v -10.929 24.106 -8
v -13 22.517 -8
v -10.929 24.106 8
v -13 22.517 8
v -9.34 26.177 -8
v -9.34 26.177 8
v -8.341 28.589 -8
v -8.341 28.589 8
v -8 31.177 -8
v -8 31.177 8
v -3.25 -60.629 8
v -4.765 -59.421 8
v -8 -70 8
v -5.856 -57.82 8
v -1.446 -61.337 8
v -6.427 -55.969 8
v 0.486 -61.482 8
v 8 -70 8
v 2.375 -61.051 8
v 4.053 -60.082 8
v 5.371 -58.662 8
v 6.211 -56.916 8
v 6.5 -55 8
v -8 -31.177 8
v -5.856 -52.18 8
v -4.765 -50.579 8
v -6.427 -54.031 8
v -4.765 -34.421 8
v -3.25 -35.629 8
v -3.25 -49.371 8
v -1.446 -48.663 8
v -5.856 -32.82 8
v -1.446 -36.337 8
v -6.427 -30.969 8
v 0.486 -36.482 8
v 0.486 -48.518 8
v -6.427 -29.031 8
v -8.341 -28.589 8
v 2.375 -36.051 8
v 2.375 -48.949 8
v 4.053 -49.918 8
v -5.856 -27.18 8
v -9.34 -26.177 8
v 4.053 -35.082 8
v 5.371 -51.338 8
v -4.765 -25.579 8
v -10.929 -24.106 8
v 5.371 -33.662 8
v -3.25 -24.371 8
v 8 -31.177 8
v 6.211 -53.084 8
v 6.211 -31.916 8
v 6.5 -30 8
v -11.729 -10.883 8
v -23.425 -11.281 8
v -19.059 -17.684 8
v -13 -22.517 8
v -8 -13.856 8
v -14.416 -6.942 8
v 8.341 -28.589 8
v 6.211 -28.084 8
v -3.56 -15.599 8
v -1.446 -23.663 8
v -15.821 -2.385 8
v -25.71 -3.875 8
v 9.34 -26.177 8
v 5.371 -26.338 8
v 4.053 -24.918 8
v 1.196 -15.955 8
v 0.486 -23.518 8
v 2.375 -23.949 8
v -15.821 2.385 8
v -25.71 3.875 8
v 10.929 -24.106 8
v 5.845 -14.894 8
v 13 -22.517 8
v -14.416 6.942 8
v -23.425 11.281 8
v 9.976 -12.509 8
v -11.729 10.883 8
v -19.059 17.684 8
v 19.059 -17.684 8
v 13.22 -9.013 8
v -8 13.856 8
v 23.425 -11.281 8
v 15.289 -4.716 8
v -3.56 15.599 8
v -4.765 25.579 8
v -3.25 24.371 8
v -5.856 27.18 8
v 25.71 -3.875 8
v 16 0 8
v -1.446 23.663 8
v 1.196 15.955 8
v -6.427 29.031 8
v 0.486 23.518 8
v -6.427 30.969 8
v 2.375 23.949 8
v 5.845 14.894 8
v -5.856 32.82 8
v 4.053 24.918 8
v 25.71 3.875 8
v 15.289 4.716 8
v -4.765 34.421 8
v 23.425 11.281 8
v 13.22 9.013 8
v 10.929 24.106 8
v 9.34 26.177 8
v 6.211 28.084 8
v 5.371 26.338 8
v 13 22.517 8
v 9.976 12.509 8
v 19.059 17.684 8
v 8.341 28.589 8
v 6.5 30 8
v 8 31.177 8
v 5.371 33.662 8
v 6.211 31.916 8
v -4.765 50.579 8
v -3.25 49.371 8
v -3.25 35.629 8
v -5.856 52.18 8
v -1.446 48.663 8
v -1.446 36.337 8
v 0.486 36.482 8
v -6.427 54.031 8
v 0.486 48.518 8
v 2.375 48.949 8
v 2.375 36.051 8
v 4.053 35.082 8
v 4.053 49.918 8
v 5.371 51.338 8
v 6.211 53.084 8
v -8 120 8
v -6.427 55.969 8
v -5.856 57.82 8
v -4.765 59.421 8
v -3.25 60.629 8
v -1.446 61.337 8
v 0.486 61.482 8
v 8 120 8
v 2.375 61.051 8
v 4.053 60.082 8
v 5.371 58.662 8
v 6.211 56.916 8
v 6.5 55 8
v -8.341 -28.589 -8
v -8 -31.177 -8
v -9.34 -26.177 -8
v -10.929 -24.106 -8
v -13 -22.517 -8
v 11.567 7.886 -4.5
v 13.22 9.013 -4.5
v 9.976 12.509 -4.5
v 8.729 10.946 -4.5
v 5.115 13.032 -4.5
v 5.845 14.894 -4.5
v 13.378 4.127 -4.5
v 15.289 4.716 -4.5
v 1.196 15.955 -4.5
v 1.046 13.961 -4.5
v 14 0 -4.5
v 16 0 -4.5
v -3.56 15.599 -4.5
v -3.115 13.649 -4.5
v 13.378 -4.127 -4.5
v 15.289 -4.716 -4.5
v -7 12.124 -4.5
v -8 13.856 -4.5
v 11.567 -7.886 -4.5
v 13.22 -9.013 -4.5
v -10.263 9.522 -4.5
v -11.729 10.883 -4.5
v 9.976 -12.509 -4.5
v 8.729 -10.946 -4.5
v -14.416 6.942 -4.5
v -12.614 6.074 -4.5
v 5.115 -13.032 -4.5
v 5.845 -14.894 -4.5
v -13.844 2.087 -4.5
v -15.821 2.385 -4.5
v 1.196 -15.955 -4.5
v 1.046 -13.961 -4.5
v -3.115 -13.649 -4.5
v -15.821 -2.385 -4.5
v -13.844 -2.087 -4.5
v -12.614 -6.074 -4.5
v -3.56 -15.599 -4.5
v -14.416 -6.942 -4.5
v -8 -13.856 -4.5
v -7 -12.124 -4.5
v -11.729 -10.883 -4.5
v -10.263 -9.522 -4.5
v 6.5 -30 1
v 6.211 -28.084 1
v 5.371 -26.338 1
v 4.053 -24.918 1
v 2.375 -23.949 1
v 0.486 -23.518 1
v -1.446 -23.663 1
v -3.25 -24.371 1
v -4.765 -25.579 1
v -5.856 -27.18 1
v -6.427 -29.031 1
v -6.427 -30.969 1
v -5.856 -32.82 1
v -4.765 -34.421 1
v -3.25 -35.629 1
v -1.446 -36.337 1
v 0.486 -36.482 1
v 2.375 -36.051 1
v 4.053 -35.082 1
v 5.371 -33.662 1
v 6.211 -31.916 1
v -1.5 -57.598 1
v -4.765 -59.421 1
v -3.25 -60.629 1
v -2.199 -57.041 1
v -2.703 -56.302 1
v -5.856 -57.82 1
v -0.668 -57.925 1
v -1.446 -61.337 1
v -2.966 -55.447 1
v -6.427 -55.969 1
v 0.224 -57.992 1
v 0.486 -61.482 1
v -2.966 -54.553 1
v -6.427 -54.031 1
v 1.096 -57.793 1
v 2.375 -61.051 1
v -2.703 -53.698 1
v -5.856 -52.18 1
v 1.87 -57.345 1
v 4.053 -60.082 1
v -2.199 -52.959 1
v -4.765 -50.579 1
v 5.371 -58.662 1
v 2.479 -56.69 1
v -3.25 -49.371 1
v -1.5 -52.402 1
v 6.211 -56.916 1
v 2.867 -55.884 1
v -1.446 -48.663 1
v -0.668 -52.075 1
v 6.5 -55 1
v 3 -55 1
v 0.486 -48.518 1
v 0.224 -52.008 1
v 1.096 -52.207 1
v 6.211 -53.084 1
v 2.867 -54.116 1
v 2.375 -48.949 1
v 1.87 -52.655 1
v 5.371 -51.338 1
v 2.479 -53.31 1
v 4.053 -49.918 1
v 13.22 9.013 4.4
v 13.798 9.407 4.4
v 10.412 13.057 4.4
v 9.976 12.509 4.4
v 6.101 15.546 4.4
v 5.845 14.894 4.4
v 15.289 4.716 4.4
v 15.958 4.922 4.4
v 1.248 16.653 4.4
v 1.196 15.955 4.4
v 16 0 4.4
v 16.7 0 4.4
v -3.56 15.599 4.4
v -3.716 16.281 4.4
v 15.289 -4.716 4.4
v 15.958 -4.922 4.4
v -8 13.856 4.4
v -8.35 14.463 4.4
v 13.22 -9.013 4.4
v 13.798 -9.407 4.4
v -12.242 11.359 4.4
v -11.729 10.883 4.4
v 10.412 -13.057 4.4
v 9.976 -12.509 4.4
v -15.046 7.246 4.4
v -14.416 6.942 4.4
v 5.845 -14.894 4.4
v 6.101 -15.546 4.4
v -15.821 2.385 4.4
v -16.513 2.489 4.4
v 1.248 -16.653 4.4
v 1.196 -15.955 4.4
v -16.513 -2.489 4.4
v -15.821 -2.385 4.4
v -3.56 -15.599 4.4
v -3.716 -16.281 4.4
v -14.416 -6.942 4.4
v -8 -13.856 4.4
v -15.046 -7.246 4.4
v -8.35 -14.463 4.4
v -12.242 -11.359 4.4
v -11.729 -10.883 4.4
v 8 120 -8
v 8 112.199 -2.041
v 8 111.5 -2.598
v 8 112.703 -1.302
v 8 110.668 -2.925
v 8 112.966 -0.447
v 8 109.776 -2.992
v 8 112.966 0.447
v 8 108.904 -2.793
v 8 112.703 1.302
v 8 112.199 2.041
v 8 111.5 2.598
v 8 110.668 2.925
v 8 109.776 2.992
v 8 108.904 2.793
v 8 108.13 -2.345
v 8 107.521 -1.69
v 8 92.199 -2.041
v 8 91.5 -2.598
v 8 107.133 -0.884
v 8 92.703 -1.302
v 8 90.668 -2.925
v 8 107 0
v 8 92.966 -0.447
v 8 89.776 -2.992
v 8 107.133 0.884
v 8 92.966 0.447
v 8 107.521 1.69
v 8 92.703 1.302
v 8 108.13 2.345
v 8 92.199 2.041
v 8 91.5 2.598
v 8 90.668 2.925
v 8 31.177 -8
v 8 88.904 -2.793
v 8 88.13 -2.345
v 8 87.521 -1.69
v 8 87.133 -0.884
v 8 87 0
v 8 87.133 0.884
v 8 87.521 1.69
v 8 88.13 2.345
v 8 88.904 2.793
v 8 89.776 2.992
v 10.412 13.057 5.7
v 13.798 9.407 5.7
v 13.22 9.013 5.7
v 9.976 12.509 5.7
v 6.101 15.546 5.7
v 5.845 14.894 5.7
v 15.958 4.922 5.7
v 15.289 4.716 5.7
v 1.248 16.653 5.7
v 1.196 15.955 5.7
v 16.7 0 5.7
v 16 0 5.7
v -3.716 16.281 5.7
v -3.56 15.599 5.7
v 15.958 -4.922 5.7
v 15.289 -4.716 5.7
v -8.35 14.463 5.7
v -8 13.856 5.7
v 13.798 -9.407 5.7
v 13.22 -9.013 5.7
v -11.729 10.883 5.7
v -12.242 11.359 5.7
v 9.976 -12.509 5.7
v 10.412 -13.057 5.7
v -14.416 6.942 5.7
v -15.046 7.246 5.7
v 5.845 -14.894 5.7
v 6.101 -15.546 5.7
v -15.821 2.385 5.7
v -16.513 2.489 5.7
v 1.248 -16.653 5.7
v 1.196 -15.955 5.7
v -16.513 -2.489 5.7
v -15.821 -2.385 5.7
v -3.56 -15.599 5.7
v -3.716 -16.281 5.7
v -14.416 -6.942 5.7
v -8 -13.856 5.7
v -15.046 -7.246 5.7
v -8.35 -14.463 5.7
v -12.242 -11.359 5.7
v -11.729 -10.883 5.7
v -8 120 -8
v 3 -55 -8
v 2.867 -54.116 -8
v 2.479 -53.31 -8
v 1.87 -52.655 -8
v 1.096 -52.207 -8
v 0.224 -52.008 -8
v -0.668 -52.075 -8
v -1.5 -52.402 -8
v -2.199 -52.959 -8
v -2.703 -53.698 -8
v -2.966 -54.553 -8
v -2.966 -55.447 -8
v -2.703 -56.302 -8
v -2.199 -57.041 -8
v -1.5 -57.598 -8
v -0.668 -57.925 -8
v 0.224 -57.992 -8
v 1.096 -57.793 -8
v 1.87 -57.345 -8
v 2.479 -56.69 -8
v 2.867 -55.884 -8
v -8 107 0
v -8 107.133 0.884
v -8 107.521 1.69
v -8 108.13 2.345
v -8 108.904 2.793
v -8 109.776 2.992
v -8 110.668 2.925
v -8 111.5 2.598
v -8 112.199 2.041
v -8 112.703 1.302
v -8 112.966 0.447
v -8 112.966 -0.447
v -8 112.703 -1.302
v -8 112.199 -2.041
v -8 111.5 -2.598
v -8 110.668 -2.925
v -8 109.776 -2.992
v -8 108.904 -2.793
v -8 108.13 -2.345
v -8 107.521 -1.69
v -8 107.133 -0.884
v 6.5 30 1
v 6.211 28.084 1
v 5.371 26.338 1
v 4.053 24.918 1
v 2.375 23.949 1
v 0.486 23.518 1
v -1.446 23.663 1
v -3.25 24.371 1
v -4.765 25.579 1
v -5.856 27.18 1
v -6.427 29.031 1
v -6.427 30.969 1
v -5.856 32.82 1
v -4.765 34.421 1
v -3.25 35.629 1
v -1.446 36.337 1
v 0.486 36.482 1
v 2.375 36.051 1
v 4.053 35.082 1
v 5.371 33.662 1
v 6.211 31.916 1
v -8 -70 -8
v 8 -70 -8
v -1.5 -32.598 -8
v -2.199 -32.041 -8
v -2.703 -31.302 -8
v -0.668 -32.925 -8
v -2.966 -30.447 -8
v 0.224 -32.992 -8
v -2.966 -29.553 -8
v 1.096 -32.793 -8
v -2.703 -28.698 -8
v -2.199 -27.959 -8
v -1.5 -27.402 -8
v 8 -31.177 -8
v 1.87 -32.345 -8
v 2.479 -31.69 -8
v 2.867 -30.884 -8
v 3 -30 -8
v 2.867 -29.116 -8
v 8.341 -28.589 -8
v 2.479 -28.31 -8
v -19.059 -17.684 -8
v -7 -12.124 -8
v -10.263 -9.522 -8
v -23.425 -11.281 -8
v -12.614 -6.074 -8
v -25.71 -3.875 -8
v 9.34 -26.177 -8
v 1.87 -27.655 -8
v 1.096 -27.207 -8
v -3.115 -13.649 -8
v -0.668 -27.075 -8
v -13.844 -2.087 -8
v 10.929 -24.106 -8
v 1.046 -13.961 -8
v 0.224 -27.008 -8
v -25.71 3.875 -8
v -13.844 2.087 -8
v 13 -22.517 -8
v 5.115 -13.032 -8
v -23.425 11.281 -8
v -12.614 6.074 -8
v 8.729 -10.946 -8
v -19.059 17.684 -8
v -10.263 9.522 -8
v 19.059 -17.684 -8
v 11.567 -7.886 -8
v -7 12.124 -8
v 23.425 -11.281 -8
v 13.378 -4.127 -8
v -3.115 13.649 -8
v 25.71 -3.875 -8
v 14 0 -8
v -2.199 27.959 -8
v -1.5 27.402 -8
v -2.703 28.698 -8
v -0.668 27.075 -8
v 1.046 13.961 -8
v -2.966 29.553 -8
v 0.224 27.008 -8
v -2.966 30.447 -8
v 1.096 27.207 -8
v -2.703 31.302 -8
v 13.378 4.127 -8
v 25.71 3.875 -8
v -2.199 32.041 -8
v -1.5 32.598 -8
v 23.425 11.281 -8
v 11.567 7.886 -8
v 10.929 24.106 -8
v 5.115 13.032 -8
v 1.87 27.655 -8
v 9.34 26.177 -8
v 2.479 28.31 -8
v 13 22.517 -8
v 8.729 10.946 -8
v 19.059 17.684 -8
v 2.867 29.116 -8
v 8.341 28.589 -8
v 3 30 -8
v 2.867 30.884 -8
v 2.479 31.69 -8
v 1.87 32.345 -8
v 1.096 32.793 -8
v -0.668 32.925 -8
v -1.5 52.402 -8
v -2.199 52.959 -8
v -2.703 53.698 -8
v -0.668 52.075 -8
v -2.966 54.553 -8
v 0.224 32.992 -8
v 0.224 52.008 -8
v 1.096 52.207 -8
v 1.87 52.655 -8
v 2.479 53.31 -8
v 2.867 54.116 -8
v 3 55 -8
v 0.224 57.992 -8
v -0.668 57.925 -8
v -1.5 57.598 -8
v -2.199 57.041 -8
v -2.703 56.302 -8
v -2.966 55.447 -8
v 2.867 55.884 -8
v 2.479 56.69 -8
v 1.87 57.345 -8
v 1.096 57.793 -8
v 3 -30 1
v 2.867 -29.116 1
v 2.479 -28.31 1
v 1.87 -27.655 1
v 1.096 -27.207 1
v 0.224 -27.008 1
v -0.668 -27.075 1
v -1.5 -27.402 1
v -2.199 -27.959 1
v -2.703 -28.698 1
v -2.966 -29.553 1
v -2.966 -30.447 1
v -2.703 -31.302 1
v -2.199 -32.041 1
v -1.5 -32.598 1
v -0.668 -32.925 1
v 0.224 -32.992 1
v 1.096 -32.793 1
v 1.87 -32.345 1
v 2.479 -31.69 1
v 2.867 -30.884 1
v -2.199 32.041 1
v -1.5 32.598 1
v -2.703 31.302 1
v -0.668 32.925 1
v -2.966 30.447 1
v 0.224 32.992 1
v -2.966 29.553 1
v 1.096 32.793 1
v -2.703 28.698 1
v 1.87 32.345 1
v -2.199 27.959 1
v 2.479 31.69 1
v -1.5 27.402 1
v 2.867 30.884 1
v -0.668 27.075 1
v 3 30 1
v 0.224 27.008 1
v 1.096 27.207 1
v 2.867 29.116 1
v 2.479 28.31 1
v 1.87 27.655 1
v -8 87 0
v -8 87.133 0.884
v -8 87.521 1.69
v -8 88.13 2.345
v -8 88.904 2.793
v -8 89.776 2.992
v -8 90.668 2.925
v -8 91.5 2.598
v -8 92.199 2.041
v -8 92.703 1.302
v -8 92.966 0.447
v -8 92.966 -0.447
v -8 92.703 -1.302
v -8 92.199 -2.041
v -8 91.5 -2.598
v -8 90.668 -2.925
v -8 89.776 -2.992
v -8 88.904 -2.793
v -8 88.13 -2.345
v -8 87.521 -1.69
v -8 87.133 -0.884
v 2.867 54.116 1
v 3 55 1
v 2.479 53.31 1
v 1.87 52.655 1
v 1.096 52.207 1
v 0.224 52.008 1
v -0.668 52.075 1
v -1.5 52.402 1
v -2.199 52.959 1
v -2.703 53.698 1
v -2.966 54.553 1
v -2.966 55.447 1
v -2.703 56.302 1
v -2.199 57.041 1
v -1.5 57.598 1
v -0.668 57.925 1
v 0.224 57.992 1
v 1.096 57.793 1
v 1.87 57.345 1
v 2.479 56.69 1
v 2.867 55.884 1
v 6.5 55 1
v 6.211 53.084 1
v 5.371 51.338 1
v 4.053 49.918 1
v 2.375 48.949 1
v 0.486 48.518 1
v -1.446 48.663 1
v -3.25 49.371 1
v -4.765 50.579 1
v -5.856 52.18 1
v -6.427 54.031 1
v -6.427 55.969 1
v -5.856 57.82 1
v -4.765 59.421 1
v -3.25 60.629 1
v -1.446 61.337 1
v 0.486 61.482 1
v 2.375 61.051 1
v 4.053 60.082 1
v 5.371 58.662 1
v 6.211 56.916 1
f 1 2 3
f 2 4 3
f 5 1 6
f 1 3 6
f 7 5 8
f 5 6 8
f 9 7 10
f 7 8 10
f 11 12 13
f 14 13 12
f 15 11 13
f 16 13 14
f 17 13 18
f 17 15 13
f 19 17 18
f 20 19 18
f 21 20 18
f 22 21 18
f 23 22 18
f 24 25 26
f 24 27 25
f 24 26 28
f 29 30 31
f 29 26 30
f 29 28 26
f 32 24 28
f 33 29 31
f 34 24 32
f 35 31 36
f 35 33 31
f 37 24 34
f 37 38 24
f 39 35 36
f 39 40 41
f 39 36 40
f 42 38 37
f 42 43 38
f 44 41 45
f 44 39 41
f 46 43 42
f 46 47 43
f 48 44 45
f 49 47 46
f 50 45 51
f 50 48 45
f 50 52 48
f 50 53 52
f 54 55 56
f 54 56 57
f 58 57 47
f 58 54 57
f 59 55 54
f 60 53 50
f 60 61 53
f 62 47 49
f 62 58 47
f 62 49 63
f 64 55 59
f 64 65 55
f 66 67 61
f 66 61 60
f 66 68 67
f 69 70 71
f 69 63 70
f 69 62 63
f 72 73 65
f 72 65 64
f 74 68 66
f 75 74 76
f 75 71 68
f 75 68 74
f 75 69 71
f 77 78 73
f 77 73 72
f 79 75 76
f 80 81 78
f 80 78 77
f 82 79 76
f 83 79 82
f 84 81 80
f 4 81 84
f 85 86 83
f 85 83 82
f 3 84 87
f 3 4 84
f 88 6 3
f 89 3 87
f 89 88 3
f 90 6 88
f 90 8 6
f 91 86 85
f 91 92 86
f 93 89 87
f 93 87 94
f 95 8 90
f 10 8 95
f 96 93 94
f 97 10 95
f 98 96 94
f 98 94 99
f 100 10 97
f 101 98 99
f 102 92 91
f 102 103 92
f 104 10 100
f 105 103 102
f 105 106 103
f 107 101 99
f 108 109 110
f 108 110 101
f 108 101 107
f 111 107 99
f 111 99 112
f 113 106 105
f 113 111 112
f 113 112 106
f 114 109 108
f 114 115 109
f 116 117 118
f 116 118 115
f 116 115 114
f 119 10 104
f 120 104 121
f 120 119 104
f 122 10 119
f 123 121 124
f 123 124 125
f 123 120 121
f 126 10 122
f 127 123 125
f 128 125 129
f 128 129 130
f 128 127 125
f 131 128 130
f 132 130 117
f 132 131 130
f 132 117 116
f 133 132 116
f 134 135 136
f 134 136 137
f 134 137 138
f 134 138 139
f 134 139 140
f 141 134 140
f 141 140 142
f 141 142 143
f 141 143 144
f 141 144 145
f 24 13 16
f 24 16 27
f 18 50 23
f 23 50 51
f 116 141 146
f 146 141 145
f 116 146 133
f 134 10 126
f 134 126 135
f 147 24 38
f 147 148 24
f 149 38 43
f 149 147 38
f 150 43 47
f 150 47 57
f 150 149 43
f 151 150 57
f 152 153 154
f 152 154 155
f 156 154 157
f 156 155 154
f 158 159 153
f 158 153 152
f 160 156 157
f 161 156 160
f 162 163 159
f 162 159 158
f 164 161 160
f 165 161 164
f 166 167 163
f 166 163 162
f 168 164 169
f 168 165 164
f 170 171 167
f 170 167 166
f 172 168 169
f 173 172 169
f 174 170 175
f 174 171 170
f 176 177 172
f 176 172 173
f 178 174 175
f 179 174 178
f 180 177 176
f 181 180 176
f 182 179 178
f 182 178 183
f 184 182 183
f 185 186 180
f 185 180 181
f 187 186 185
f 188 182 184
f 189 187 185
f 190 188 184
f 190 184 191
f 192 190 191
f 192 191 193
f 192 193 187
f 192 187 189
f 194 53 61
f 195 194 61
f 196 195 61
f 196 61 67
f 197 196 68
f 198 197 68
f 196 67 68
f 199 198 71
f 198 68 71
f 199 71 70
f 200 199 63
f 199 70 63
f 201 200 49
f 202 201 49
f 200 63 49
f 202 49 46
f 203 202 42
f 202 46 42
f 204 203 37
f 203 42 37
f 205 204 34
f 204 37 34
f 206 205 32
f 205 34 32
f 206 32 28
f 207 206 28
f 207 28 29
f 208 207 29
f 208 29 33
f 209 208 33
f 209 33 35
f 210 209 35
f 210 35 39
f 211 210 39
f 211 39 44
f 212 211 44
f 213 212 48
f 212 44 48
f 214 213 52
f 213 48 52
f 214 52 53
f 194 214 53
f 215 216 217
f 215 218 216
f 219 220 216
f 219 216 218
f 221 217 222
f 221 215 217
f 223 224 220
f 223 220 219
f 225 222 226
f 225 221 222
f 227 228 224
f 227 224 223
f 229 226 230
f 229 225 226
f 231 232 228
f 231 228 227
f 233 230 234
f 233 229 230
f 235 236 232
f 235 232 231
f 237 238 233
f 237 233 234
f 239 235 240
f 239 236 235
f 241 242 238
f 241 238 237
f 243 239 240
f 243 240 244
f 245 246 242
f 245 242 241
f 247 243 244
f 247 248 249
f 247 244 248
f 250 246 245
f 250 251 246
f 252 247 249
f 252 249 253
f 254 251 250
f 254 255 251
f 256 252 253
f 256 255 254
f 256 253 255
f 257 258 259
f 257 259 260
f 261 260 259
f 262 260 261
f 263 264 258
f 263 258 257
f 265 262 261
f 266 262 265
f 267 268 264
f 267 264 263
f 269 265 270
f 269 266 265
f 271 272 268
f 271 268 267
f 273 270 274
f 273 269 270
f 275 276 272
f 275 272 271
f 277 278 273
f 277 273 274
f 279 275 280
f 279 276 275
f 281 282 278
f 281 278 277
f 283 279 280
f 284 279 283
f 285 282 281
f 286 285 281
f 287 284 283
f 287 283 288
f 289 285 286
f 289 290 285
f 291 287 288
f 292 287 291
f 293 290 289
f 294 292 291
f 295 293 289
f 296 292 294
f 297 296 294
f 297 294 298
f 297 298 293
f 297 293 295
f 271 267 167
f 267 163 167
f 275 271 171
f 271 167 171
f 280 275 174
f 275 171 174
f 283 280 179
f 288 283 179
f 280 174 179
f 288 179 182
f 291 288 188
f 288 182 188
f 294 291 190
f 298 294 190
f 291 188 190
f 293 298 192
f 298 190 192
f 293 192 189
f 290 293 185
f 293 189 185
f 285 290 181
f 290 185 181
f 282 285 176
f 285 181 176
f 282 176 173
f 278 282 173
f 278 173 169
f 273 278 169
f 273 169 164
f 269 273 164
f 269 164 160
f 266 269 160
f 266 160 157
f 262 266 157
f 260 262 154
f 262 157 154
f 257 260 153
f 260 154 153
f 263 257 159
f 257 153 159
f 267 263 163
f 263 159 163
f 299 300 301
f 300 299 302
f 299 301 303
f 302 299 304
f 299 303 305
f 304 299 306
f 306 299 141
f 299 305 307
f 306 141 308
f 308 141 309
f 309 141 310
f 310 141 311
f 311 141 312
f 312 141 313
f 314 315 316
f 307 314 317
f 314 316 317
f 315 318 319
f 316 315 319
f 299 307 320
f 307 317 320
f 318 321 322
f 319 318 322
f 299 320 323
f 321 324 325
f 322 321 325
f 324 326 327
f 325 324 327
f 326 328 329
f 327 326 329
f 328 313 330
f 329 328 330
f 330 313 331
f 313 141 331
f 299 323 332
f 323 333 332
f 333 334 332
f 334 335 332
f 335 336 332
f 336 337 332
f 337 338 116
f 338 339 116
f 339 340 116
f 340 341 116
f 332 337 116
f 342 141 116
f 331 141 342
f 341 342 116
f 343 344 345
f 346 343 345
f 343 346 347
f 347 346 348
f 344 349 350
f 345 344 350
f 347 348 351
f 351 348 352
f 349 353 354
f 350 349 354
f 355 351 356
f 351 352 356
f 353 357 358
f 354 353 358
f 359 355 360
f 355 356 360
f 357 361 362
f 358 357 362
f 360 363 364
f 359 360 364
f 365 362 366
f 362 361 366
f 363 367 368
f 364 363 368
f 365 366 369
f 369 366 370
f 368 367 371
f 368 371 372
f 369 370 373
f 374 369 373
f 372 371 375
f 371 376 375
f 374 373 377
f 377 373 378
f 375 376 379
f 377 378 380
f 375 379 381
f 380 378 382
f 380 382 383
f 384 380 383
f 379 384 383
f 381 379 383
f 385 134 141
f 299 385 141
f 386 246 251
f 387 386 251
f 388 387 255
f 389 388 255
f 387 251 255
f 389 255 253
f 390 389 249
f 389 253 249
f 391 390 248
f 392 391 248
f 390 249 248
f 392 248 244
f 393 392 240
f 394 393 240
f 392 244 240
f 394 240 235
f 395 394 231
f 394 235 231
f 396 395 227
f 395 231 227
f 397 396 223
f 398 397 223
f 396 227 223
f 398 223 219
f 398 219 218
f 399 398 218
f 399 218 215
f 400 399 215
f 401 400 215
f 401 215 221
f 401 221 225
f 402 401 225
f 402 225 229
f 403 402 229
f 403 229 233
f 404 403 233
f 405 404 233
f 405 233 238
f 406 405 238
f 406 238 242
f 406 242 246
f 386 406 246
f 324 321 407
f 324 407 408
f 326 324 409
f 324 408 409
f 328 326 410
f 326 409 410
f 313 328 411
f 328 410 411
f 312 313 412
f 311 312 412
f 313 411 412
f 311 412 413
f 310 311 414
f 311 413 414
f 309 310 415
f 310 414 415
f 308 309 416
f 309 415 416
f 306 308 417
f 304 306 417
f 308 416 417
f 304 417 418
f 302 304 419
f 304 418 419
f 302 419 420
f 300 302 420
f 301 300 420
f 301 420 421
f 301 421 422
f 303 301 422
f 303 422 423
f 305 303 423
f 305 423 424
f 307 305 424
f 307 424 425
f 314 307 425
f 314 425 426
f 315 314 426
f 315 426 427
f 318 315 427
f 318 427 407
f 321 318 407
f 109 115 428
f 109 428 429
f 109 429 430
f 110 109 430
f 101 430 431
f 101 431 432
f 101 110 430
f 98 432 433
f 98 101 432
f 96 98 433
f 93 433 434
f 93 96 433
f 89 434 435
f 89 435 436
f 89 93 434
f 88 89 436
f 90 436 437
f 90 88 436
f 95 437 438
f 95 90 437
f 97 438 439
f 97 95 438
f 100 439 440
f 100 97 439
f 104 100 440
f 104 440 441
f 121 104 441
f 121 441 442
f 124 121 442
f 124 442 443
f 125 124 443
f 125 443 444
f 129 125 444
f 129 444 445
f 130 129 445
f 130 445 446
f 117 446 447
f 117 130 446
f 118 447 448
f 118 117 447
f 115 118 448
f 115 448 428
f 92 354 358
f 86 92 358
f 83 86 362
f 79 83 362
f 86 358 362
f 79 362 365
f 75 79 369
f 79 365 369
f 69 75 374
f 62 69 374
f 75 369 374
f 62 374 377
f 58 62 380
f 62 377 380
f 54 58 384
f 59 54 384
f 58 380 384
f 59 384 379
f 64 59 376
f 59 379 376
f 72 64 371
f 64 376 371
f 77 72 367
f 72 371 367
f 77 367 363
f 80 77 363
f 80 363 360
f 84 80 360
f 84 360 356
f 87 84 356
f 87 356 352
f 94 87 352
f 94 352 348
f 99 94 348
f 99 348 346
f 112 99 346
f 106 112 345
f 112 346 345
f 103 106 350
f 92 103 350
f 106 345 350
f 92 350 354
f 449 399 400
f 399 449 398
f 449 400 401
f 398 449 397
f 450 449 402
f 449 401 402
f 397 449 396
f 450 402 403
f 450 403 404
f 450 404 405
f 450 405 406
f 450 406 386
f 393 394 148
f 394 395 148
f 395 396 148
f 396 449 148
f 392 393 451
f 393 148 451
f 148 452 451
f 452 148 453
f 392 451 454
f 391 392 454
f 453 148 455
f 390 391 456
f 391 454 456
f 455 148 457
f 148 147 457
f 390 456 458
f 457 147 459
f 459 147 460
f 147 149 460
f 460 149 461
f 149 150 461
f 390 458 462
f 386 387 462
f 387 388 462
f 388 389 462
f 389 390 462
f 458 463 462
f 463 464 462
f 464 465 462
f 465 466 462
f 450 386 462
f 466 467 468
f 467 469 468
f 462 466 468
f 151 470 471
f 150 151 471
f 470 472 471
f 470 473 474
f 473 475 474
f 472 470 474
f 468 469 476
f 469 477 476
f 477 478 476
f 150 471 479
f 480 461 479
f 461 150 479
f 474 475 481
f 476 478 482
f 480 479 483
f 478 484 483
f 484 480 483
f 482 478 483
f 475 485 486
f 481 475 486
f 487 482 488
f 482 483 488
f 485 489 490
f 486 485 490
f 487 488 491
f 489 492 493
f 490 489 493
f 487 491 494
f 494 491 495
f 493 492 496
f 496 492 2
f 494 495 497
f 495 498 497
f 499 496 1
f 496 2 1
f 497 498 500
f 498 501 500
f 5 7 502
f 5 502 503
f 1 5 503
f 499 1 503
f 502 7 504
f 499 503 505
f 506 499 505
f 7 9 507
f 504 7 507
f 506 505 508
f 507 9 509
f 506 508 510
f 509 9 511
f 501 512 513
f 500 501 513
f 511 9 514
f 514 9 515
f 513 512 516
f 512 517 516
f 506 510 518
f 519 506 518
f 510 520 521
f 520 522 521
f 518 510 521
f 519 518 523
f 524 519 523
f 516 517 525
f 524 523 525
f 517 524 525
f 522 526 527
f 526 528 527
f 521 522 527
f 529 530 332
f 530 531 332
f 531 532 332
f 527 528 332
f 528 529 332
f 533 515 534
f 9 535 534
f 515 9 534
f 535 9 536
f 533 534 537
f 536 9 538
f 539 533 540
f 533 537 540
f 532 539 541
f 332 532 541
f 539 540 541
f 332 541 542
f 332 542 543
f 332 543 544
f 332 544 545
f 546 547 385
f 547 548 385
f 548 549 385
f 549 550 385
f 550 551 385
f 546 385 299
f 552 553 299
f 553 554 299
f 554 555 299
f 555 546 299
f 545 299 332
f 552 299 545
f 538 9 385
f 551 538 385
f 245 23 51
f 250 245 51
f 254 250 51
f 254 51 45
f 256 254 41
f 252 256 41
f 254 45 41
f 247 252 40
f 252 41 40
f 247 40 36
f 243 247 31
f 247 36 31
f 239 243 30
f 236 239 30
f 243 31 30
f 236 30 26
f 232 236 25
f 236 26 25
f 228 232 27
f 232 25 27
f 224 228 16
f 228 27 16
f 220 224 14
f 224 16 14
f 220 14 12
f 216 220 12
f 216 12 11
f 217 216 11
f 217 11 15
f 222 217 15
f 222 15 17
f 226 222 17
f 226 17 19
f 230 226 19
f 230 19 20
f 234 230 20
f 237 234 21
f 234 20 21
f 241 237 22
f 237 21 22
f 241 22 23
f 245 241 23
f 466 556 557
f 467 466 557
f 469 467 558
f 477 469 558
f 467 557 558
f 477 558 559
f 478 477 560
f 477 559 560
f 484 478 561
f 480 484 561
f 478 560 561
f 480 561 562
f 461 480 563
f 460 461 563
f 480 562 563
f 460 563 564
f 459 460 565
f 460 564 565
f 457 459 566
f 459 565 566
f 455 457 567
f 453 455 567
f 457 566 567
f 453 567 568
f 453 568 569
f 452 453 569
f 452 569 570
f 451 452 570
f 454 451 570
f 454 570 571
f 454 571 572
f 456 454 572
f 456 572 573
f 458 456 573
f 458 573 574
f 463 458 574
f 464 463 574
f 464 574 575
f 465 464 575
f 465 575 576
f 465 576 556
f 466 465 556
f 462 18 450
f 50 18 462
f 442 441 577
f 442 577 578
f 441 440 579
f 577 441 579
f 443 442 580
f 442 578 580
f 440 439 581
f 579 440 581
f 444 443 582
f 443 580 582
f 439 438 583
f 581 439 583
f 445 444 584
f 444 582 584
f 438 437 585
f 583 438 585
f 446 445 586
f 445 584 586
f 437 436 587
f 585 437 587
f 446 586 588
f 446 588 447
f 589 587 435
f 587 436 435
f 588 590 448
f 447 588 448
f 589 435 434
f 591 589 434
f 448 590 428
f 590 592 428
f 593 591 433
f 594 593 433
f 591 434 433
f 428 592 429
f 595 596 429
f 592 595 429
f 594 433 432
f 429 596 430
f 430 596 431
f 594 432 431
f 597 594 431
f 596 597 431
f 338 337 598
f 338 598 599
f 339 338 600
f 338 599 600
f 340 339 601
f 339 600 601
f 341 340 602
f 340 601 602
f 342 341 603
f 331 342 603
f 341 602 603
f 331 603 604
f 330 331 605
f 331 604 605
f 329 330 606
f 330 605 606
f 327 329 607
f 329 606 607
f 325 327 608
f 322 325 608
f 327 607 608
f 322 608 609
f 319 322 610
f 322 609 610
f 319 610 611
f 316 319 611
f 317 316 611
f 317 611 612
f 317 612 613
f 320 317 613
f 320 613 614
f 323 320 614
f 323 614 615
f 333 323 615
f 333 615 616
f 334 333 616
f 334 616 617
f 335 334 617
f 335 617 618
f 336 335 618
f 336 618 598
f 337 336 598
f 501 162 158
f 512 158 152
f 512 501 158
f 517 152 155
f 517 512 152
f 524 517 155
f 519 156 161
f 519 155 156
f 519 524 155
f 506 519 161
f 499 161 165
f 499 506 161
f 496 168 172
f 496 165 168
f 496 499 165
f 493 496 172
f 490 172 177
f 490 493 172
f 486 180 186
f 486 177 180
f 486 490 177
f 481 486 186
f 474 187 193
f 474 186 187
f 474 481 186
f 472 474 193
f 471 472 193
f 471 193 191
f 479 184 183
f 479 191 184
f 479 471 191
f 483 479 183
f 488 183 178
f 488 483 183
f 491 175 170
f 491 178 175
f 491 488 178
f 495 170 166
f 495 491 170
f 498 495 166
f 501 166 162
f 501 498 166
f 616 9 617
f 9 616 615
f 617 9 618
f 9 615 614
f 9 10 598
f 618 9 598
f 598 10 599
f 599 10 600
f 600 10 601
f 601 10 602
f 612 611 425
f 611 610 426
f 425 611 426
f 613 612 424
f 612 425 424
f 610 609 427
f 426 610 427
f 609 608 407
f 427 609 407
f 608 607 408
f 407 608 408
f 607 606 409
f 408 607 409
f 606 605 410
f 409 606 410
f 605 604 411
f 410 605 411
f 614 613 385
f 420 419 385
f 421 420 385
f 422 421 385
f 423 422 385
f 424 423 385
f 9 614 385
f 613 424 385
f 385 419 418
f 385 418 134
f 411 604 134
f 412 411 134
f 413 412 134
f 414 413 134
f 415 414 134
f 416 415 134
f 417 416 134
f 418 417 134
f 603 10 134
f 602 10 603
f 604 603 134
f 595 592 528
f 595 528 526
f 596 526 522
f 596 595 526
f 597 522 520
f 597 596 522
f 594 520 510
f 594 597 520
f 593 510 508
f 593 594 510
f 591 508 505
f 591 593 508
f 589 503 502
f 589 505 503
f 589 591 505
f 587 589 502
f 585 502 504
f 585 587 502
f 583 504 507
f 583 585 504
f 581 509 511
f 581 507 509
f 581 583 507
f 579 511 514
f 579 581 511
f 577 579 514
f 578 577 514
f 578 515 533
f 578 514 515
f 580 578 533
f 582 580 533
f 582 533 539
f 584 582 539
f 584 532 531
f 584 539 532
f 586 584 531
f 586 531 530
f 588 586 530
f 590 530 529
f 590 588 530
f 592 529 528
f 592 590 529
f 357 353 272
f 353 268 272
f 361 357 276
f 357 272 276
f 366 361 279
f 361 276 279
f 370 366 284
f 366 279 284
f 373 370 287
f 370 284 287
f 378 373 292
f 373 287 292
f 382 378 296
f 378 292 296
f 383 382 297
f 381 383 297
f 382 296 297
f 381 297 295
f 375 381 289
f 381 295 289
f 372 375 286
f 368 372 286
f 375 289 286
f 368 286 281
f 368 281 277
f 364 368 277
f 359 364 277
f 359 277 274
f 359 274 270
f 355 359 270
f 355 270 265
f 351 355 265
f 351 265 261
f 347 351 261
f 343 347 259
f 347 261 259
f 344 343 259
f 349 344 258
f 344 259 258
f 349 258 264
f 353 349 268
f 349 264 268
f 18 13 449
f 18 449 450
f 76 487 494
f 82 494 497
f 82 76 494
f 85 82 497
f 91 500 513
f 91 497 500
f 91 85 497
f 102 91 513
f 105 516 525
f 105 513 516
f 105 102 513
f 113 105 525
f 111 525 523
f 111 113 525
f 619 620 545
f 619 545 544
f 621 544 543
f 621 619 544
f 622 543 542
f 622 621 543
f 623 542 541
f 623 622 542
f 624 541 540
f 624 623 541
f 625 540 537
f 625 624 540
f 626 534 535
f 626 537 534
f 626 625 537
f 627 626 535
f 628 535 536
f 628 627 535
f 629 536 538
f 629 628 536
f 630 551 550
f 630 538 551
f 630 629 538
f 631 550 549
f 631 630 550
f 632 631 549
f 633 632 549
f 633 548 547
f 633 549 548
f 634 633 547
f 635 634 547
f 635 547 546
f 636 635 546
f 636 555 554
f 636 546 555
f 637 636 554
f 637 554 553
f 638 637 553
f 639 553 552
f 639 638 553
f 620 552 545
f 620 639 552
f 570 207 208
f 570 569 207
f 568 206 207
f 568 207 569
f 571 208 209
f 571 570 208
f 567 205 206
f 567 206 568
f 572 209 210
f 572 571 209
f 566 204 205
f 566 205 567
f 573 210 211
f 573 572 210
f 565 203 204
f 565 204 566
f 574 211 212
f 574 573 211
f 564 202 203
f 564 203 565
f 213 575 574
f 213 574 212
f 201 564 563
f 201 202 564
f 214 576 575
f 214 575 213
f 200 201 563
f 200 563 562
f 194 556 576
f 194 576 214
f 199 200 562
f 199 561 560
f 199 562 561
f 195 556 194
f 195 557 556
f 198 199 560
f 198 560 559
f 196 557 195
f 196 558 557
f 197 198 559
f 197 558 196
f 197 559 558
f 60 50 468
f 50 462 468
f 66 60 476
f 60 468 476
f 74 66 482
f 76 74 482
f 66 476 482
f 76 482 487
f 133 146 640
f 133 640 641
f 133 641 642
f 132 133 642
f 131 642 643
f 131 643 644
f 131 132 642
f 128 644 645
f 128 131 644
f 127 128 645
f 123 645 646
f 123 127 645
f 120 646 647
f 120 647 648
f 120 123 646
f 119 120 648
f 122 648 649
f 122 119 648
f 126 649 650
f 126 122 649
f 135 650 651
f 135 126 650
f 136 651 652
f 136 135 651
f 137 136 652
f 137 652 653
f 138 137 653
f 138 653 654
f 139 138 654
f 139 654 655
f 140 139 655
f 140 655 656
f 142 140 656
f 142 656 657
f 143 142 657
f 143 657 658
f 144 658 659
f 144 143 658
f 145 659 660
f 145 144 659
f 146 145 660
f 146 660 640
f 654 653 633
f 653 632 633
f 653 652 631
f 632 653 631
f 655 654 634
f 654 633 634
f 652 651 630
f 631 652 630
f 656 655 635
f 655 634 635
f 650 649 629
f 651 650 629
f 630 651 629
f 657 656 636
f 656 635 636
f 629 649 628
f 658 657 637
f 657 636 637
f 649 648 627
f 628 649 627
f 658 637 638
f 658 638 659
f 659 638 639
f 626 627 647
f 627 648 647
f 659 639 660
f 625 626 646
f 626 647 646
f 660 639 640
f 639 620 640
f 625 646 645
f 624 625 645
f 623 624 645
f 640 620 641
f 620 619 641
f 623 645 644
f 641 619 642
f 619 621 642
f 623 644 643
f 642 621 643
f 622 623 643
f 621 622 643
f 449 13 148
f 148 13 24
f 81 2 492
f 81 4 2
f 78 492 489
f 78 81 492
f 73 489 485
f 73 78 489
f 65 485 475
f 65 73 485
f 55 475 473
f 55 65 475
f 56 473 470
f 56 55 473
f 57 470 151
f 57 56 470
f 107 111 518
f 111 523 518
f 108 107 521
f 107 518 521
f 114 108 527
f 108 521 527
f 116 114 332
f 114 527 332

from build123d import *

# Parameters (mm, degrees)
SKETCH1_R           = 26
SKETCH1_R_2         = 14
BOSS_EXTRUDE1_DEPTH = 8
BOSS_EXTRUDE2_DEPTH = 8
SKETCH3_W           = 12.5
SKETCH3_H           = 2
SKETCH4_W           = 1.3
SKETCH4_H           = 0.7
SKETCH5_W           = 16
SKETCH5_H           = 45.261366246
BOSS_EXTRUDE3_DEPTH = 8
FILLET1_R           = 10
SKETCH6_R           = 3
CUT_EXTRUDE1_DEPTH  = 125.9799984
SKETCH9_R           = 6.5
CUT_EXTRUDE4_DEPTH  = 7
SKETCH10_R          = 3
CUT_EXTRUDE5_DEPTH  = 124.822453537


with BuildPart() as part:
    # Sketch1 → Boss-Extrude1 (new, symmetric)
    with BuildSketch(Plane.XY):
        Circle(SKETCH1_R)
        Circle(SKETCH1_R_2, mode=Mode.SUBTRACT)
    extrude(amount=BOSS_EXTRUDE1_DEPTH, both=True)

    # Sketch2 → Boss-Extrude2 (add, symmetric)
    with BuildSketch(Plane.XY):
        Polygon((-8, 120), (8, 120), (8, 24.738633754), (0, 26), (-8, 24.738633754), align=None)
    extrude(amount=BOSS_EXTRUDE2_DEPTH, both=True)

    # Sketch3 → Cut-Revolve1 (revolve, cut)
    with BuildSketch(Plane(origin=(0, 0, 0), x_dir=(0, 0, -1), z_dir=(1, 0, 0)), mode=Mode.PRIVATE) as cut_revolve1_sk:
        with Locations((-1.75, 15)):
            Rectangle(SKETCH3_W, SKETCH3_H)
    revolve(cut_revolve1_sk.sketch.rotate(Axis((0, 0, 0), (0, 0, -1)), 90), axis=Axis((0, 0, 0), (0, 0, -1)), mode=Mode.SUBTRACT)

    # Sketch4 → Cut-Revolve2 (revolve, cut)
    with BuildSketch(Plane(origin=(0, 0, 0), x_dir=(0, 0, -1), z_dir=(1, 0, 0)), mode=Mode.PRIVATE) as cut_revolve2_sk:
        with Locations((-5.05, 16.35)):
            Rectangle(SKETCH4_W, SKETCH4_H)
    revolve(cut_revolve2_sk.sketch.rotate(Axis((0, 0, 0), (0, 0, -1)), 90), axis=Axis((0, 0, 0), (0, 0, -1)), mode=Mode.SUBTRACT)

    # Sketch5 → Boss-Extrude3 (add, symmetric)
    with BuildSketch(Plane.XY):
        with Locations((0, -47.369316877)):
            Rectangle(SKETCH5_W, SKETCH5_H)
    extrude(amount=BOSS_EXTRUDE3_DEPTH, both=True)

    # Fillet1
    fillet1_edges = [part.edges().sort_by_distance(p)[0] for p in [
        (8, 24.738633754, 0),
        (-8, 24.738633754, 0),
        (8, -24.738633754, 0),
        (-8, -24.738633754, 0),
    ]]
    fillet(fillet1_edges, radius=FILLET1_R)

    # Sketch6 → Cut-Extrude1 (cut, through all)
    with BuildSketch(Plane.ZY.offset(8)):
        with Locations(Location((0, 110, 0), (0, 0, 270))):
            Circle(SKETCH6_R)
        with Locations(Location((0, 90, 0), (0, 0, 270))):
            Circle(SKETCH6_R)
    extrude(amount=-CUT_EXTRUDE1_DEPTH, mode=Mode.SUBTRACT)

    # Sketch9 → Cut-Extrude4 (cut)
    with BuildSketch(Plane.XY.offset(8)):
        with Locations((0, -55)):
            Circle(SKETCH9_R)
        with Locations((0, -30)):
            Circle(SKETCH9_R)
    cut_extrude4 = extrude(amount=-CUT_EXTRUDE4_DEPTH, mode=Mode.SUBTRACT)

    # Sketch10 → Cut-Extrude5 (cut, through all)
    with BuildSketch(Plane.XY.offset(8)):
        with Locations((0, -30)):
            Circle(SKETCH10_R)
        with Locations((0, -55)):
            Circle(SKETCH10_R)
    cut_extrude5 = extrude(amount=-CUT_EXTRUDE5_DEPTH, mode=Mode.SUBTRACT)

    # Mirror1: Cut-Extrude4 across plane
    add(cut_extrude4.mirror(Plane.ZX), mode=Mode.SUBTRACT)

    # Mirror2: Cut-Extrude5 across plane
    add(cut_extrude5.mirror(Plane.ZX), mode=Mode.SUBTRACT)


solid = part.part
